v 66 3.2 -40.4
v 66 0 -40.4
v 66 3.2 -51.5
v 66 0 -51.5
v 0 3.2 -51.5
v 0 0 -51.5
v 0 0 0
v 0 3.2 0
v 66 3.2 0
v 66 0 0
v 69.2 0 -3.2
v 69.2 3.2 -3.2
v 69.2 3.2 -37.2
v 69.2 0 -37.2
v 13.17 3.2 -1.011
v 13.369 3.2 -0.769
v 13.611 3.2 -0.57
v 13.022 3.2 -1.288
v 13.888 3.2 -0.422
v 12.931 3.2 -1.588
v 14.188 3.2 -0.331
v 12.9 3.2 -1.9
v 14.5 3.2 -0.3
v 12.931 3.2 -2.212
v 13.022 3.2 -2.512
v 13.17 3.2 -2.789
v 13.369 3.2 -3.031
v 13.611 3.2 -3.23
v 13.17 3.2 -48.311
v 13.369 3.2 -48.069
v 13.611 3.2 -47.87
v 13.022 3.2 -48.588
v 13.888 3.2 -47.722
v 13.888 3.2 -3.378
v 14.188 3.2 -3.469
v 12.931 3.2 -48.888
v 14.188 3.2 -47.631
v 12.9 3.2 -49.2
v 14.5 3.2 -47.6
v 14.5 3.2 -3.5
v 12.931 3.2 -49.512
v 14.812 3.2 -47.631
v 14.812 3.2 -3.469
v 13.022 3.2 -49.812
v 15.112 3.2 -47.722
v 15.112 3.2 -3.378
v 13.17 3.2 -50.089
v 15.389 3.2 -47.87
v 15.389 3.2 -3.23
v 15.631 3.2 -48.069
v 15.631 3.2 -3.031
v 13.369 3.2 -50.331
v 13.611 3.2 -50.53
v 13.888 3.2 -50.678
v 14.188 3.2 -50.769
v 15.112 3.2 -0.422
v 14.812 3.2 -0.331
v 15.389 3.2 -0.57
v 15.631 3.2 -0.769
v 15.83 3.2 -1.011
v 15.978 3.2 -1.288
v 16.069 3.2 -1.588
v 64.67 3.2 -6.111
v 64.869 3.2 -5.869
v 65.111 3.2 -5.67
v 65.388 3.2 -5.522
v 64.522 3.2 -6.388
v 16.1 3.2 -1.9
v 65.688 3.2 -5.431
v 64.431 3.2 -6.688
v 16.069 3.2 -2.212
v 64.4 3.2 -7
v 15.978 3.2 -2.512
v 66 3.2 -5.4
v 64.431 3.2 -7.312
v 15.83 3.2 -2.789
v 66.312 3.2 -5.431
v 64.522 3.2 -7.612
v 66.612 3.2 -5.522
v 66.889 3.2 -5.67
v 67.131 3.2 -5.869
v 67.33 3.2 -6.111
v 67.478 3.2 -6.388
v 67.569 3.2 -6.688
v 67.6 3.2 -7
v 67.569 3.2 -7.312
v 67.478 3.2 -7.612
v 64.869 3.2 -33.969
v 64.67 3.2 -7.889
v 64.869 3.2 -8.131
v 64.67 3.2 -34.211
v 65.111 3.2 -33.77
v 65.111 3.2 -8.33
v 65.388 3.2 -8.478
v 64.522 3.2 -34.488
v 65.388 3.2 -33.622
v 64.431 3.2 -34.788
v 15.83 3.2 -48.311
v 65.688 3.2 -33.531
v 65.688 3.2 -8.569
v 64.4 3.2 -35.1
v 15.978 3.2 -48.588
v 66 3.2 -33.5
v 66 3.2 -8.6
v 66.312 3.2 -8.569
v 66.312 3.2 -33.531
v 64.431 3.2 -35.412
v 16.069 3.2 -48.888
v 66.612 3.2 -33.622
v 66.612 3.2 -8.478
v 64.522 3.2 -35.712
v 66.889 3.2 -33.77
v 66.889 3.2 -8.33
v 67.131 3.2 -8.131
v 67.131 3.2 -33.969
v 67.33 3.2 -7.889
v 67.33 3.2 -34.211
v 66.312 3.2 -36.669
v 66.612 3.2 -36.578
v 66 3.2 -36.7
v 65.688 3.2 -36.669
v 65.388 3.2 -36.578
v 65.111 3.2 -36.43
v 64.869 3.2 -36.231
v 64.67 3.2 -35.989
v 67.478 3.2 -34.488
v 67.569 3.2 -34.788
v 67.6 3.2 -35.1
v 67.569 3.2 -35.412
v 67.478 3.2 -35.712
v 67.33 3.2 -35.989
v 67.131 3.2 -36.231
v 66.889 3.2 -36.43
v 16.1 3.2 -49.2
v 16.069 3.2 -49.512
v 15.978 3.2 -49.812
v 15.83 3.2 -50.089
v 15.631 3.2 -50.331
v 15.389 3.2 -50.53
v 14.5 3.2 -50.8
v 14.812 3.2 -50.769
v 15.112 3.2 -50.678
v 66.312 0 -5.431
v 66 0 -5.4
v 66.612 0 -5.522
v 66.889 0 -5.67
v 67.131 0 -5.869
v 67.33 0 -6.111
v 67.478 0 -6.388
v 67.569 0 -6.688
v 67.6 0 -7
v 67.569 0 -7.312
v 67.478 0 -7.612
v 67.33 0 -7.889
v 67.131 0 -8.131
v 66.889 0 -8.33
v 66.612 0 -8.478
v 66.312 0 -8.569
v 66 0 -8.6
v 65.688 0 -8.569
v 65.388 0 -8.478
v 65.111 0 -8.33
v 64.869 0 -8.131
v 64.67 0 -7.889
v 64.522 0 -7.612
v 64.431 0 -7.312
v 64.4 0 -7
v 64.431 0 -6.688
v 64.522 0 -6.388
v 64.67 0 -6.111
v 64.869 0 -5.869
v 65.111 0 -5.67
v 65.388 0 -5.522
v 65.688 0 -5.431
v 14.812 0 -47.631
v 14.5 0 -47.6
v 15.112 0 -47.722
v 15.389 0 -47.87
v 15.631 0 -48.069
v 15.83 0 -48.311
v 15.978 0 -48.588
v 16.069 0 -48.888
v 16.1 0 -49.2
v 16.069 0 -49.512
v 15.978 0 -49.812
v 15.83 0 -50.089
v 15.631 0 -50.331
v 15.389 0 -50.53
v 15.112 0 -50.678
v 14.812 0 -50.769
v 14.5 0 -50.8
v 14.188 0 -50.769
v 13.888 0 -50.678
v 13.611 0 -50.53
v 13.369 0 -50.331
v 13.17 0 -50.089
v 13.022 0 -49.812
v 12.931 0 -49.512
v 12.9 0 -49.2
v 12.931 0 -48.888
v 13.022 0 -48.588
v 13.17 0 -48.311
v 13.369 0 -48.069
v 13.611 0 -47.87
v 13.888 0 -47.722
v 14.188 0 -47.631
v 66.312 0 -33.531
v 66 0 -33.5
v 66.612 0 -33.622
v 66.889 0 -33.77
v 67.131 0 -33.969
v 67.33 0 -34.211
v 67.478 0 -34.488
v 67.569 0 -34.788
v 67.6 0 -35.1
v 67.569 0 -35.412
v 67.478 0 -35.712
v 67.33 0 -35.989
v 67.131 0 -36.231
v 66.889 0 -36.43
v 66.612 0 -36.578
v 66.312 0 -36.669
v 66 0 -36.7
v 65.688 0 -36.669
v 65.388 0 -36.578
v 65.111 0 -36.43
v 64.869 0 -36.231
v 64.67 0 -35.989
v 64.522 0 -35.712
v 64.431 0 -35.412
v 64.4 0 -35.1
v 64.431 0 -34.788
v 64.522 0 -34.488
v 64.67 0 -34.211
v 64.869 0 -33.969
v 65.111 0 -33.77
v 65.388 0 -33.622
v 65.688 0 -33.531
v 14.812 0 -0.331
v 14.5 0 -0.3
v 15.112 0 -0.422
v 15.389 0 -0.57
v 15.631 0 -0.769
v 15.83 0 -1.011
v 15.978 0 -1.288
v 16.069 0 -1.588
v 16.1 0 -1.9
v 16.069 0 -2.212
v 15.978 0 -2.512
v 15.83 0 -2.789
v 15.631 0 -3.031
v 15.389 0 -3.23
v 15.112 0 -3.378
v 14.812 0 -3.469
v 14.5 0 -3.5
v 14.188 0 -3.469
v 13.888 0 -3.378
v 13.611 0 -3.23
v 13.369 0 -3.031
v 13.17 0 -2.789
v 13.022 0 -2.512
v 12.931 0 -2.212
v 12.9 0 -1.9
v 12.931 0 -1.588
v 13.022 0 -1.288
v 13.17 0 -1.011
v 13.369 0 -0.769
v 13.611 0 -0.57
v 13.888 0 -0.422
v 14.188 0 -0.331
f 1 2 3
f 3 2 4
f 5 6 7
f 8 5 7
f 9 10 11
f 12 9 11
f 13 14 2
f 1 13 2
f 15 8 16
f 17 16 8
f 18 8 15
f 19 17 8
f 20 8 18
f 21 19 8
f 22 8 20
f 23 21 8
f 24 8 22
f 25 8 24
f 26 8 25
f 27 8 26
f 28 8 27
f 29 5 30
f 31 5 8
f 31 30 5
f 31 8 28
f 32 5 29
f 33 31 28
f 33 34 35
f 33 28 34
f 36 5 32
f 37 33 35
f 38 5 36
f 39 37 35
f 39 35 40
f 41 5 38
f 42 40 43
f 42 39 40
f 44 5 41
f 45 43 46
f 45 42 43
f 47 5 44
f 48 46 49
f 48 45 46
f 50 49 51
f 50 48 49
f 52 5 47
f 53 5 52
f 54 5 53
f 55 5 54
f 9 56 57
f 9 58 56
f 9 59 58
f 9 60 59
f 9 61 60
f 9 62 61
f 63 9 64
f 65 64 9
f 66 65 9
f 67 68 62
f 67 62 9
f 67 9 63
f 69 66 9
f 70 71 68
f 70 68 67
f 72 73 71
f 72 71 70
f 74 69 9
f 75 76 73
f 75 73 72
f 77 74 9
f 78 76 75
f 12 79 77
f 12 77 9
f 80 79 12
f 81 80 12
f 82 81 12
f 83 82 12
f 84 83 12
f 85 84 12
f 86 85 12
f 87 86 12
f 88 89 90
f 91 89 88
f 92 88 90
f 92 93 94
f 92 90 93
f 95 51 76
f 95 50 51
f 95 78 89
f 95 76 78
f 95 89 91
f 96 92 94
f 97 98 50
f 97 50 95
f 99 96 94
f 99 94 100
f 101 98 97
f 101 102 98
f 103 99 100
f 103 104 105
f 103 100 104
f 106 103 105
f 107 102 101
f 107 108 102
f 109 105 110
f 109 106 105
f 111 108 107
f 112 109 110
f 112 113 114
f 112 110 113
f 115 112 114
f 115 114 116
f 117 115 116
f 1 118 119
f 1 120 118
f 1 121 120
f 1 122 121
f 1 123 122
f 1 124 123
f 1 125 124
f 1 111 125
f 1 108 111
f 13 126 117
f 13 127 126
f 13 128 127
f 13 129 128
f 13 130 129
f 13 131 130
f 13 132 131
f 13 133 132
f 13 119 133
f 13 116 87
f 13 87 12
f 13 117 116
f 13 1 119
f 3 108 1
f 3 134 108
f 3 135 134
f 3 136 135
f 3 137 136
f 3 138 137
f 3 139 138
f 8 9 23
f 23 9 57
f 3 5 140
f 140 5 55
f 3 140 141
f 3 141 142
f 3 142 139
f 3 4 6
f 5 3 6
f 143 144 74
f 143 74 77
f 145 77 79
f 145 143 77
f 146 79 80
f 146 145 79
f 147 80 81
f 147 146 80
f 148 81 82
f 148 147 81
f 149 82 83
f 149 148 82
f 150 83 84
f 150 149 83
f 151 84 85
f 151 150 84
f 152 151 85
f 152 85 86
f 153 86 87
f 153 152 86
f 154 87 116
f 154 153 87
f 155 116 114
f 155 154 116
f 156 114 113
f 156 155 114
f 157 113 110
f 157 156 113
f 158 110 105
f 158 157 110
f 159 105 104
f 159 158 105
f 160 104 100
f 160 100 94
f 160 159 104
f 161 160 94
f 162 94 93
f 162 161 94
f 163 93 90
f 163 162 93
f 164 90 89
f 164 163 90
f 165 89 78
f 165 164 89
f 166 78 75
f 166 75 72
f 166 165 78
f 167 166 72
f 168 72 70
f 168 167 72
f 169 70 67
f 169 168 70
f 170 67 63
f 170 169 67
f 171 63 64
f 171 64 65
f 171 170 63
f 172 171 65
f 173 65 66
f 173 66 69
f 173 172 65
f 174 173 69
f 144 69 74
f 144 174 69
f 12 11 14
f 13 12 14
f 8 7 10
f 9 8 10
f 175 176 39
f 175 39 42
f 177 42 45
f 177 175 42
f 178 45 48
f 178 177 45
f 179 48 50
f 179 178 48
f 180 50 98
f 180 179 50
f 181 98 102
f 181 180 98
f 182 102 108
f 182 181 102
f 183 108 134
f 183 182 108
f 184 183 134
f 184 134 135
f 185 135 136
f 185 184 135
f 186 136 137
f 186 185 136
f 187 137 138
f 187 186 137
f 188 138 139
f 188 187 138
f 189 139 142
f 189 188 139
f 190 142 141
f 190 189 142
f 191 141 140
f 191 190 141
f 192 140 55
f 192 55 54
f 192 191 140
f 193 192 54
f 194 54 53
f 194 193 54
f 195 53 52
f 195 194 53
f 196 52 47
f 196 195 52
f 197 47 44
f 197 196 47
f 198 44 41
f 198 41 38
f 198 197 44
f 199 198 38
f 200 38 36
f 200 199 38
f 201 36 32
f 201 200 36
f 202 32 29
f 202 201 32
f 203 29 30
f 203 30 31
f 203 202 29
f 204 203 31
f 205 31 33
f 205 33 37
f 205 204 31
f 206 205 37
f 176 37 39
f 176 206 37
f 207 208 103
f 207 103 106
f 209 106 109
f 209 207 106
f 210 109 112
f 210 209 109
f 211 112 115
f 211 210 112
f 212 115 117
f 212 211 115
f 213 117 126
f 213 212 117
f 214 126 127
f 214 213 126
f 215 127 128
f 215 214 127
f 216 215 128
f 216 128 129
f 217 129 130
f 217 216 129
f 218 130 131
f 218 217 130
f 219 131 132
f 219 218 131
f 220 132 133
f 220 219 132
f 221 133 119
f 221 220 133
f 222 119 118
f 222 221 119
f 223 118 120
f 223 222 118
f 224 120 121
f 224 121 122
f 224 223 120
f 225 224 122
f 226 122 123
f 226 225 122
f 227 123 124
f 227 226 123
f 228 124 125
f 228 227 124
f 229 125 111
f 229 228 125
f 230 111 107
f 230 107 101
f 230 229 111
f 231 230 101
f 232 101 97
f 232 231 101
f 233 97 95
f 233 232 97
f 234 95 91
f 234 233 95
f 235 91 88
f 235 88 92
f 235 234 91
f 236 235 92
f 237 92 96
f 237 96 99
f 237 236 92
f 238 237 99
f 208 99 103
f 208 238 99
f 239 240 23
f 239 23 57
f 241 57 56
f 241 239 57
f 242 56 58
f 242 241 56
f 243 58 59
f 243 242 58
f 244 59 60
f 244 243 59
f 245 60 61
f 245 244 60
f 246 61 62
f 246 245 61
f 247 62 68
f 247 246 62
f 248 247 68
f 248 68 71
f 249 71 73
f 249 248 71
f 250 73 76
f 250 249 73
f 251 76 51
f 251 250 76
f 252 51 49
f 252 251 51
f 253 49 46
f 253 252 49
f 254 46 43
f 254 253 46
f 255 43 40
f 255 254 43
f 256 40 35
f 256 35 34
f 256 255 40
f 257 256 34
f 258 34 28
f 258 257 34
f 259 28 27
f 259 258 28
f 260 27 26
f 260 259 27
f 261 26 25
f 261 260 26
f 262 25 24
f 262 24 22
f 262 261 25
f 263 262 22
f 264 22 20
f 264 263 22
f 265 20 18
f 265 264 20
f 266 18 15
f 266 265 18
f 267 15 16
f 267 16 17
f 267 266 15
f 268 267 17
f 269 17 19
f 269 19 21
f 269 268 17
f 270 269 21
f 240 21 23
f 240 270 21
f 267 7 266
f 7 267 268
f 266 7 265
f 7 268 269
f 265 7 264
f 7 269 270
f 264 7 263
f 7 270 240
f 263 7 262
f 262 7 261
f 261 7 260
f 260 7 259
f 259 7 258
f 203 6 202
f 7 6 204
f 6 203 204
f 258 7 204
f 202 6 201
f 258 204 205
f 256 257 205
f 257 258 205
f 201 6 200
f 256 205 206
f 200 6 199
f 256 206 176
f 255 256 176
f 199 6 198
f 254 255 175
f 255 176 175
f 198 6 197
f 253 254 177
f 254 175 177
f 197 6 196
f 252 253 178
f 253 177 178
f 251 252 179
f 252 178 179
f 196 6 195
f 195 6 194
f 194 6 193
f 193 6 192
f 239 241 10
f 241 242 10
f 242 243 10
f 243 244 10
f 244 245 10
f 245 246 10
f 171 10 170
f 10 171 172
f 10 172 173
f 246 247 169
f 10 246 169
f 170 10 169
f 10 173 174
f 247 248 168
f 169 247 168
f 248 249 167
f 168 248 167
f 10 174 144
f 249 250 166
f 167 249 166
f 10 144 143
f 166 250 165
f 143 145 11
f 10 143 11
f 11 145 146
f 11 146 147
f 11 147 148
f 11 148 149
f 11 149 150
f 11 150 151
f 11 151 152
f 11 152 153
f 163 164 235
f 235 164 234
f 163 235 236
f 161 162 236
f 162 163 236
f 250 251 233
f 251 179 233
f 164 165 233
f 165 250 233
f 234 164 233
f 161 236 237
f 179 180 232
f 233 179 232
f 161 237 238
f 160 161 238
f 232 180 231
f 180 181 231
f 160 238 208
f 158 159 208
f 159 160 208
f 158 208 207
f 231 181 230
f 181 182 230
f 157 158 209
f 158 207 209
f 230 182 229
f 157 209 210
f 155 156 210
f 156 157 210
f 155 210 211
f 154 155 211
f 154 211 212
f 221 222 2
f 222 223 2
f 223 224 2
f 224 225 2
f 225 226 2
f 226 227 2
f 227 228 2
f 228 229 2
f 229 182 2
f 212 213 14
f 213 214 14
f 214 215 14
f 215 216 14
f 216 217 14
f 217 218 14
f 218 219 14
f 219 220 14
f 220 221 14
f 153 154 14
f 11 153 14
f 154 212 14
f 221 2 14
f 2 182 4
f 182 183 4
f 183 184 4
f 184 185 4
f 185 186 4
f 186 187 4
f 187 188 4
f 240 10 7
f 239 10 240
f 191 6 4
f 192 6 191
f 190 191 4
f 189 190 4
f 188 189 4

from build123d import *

# Parameters (mm, degrees)
CROQUIS1_R              = 1.6
SALIENTE_EXTRUIR1_DEPTH = 3.2


with BuildPart() as part:
    # Croquis1 → Saliente-Extruir1 (new body)
    with BuildSketch(Plane(origin=(0, 0, 0), x_dir=(1, 0, 0), z_dir=(0, 1, 0))):
        Polygon((0, 0), (66, 0), (69.2, 3.2), (69.2, 37.2), (66, 40.4), (66, 51.5), (0, 51.5), align=None)
        with Locations(Location((14.5, 49.2, 0), (0, 0, 270))):
            Circle(CROQUIS1_R, mode=Mode.SUBTRACT)
        with Locations(Location((14.5, 1.9, 0), (0, 0, 270))):
            Circle(CROQUIS1_R, mode=Mode.SUBTRACT)
        with Locations(Location((66, 35.1, 0), (0, 0, 270))):
            Circle(CROQUIS1_R, mode=Mode.SUBTRACT)
        with Locations(Location((66, 7, 0), (0, 0, 270))):
            Circle(CROQUIS1_R, mode=Mode.SUBTRACT)
    extrude(amount=SALIENTE_EXTRUIR1_DEPTH)


solid = part.part
